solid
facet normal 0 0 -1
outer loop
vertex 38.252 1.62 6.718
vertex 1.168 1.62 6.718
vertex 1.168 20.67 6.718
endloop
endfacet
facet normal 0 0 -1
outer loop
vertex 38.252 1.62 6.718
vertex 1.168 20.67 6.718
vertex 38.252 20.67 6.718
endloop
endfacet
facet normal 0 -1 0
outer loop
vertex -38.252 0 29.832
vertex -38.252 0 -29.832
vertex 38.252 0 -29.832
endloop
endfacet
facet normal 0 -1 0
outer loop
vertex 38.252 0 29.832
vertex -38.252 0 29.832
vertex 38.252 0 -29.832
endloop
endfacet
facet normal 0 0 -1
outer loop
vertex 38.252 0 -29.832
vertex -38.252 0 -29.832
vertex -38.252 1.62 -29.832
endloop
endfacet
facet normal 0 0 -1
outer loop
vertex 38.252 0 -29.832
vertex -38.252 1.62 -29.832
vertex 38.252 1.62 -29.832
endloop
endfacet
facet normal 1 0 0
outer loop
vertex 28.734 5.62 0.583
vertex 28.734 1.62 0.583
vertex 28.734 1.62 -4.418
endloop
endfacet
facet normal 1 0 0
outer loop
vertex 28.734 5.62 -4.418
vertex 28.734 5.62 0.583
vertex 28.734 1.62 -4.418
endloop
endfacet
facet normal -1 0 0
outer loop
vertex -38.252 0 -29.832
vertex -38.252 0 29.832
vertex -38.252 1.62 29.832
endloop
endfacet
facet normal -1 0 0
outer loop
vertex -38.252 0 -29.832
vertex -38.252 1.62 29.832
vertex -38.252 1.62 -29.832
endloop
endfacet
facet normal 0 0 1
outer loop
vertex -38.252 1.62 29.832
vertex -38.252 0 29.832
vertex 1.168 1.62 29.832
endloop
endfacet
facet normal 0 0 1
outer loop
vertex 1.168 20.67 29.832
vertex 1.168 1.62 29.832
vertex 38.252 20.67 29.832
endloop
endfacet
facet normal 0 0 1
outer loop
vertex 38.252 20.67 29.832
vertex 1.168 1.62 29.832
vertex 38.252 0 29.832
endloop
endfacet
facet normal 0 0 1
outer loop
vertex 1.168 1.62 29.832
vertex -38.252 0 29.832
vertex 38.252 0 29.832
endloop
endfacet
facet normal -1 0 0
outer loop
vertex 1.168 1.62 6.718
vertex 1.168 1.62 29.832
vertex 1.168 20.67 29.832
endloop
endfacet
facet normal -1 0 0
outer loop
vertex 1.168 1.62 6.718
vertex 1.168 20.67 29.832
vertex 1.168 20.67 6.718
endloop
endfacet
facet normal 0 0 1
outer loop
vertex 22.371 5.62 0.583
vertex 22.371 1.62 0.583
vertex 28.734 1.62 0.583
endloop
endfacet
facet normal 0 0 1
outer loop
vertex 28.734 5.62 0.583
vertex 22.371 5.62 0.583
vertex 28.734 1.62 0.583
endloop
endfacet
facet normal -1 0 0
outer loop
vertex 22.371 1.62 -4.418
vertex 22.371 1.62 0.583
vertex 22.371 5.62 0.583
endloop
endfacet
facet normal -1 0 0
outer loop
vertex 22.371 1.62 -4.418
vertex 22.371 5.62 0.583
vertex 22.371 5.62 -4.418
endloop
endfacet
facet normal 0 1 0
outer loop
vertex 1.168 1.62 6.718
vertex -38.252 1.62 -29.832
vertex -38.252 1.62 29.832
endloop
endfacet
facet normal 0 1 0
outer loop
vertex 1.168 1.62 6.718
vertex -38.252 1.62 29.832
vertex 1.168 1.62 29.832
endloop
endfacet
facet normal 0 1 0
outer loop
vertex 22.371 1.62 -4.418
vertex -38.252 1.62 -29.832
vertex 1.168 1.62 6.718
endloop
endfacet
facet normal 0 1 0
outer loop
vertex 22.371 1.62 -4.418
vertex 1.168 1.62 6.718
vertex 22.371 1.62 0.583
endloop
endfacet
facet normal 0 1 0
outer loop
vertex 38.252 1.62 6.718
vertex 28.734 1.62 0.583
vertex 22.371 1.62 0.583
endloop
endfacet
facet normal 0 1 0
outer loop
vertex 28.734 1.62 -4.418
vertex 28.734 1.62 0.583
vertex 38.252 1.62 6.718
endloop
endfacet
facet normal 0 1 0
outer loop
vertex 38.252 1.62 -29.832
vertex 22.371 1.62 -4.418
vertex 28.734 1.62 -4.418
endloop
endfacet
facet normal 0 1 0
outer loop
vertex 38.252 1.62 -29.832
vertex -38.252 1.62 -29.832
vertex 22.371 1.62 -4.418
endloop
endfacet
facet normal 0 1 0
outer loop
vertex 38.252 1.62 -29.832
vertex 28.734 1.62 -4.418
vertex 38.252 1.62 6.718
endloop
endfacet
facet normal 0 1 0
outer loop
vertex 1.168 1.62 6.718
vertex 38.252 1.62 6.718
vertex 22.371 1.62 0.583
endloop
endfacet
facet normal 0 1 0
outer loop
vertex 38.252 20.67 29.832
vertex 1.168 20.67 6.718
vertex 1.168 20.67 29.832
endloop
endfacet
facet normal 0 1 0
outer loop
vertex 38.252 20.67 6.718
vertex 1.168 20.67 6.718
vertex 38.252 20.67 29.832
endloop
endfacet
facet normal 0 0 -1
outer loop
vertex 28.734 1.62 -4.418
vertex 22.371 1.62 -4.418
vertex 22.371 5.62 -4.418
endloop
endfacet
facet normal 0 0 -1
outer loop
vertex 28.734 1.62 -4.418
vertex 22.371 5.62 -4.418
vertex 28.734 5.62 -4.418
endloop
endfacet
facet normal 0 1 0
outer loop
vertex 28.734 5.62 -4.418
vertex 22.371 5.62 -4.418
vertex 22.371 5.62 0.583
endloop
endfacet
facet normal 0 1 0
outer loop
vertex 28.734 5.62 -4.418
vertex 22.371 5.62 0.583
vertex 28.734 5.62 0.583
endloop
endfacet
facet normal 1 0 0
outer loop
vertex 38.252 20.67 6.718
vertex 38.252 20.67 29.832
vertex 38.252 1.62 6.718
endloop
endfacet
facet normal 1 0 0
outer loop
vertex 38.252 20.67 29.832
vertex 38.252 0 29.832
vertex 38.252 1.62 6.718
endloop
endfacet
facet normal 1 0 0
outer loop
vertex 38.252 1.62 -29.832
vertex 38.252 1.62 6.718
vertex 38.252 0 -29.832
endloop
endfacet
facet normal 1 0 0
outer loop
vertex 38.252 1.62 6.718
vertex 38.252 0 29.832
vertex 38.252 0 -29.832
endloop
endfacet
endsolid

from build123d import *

# Parameters (mm, degrees)
SKETCH1_W           = 76.5048
SKETCH1_H           = 59.6646
BOSS_EXTRUDE1_DEPTH = 1.62
SKETCH2_W           = 37.084
SKETCH2_H           = 23.114
BOSS_EXTRUDE2_DEPTH = 19.05
SKETCH3_W           = 6.362801742
SKETCH3_H           = 5.001103528
BOSS_EXTRUDE3_DEPTH = 4


with BuildPart() as part:
    # Sketch1 → Boss-Extrude1 (new body)
    with BuildSketch(Plane(origin=(0, 0, 0), x_dir=(1, 0, 0), z_dir=(0, 1, 0))):
        Rectangle(SKETCH1_W, SKETCH1_H)
    extrude(amount=BOSS_EXTRUDE1_DEPTH)

    # Sketch2 → Boss-Extrude2 (add)
    with BuildSketch(Plane(origin=(0, 1.62, 0), x_dir=(1, 0, 0), z_dir=(0, 1, 0))):
        with Locations((19.7104, -18.2753)):
            Rectangle(SKETCH2_W, SKETCH2_H)
    extrude(amount=BOSS_EXTRUDE2_DEPTH)

    # Sketch3 → Boss-Extrude3 (add)
    with BuildSketch(Plane(origin=(0, 1.62, 0), x_dir=(1, 0, 0), z_dir=(0, 1, 0))):
        with Locations((25.5524, 1.9177)):
            Rectangle(SKETCH3_W, SKETCH3_H)
    extrude(amount=BOSS_EXTRUDE3_DEPTH)


solid = part.part
